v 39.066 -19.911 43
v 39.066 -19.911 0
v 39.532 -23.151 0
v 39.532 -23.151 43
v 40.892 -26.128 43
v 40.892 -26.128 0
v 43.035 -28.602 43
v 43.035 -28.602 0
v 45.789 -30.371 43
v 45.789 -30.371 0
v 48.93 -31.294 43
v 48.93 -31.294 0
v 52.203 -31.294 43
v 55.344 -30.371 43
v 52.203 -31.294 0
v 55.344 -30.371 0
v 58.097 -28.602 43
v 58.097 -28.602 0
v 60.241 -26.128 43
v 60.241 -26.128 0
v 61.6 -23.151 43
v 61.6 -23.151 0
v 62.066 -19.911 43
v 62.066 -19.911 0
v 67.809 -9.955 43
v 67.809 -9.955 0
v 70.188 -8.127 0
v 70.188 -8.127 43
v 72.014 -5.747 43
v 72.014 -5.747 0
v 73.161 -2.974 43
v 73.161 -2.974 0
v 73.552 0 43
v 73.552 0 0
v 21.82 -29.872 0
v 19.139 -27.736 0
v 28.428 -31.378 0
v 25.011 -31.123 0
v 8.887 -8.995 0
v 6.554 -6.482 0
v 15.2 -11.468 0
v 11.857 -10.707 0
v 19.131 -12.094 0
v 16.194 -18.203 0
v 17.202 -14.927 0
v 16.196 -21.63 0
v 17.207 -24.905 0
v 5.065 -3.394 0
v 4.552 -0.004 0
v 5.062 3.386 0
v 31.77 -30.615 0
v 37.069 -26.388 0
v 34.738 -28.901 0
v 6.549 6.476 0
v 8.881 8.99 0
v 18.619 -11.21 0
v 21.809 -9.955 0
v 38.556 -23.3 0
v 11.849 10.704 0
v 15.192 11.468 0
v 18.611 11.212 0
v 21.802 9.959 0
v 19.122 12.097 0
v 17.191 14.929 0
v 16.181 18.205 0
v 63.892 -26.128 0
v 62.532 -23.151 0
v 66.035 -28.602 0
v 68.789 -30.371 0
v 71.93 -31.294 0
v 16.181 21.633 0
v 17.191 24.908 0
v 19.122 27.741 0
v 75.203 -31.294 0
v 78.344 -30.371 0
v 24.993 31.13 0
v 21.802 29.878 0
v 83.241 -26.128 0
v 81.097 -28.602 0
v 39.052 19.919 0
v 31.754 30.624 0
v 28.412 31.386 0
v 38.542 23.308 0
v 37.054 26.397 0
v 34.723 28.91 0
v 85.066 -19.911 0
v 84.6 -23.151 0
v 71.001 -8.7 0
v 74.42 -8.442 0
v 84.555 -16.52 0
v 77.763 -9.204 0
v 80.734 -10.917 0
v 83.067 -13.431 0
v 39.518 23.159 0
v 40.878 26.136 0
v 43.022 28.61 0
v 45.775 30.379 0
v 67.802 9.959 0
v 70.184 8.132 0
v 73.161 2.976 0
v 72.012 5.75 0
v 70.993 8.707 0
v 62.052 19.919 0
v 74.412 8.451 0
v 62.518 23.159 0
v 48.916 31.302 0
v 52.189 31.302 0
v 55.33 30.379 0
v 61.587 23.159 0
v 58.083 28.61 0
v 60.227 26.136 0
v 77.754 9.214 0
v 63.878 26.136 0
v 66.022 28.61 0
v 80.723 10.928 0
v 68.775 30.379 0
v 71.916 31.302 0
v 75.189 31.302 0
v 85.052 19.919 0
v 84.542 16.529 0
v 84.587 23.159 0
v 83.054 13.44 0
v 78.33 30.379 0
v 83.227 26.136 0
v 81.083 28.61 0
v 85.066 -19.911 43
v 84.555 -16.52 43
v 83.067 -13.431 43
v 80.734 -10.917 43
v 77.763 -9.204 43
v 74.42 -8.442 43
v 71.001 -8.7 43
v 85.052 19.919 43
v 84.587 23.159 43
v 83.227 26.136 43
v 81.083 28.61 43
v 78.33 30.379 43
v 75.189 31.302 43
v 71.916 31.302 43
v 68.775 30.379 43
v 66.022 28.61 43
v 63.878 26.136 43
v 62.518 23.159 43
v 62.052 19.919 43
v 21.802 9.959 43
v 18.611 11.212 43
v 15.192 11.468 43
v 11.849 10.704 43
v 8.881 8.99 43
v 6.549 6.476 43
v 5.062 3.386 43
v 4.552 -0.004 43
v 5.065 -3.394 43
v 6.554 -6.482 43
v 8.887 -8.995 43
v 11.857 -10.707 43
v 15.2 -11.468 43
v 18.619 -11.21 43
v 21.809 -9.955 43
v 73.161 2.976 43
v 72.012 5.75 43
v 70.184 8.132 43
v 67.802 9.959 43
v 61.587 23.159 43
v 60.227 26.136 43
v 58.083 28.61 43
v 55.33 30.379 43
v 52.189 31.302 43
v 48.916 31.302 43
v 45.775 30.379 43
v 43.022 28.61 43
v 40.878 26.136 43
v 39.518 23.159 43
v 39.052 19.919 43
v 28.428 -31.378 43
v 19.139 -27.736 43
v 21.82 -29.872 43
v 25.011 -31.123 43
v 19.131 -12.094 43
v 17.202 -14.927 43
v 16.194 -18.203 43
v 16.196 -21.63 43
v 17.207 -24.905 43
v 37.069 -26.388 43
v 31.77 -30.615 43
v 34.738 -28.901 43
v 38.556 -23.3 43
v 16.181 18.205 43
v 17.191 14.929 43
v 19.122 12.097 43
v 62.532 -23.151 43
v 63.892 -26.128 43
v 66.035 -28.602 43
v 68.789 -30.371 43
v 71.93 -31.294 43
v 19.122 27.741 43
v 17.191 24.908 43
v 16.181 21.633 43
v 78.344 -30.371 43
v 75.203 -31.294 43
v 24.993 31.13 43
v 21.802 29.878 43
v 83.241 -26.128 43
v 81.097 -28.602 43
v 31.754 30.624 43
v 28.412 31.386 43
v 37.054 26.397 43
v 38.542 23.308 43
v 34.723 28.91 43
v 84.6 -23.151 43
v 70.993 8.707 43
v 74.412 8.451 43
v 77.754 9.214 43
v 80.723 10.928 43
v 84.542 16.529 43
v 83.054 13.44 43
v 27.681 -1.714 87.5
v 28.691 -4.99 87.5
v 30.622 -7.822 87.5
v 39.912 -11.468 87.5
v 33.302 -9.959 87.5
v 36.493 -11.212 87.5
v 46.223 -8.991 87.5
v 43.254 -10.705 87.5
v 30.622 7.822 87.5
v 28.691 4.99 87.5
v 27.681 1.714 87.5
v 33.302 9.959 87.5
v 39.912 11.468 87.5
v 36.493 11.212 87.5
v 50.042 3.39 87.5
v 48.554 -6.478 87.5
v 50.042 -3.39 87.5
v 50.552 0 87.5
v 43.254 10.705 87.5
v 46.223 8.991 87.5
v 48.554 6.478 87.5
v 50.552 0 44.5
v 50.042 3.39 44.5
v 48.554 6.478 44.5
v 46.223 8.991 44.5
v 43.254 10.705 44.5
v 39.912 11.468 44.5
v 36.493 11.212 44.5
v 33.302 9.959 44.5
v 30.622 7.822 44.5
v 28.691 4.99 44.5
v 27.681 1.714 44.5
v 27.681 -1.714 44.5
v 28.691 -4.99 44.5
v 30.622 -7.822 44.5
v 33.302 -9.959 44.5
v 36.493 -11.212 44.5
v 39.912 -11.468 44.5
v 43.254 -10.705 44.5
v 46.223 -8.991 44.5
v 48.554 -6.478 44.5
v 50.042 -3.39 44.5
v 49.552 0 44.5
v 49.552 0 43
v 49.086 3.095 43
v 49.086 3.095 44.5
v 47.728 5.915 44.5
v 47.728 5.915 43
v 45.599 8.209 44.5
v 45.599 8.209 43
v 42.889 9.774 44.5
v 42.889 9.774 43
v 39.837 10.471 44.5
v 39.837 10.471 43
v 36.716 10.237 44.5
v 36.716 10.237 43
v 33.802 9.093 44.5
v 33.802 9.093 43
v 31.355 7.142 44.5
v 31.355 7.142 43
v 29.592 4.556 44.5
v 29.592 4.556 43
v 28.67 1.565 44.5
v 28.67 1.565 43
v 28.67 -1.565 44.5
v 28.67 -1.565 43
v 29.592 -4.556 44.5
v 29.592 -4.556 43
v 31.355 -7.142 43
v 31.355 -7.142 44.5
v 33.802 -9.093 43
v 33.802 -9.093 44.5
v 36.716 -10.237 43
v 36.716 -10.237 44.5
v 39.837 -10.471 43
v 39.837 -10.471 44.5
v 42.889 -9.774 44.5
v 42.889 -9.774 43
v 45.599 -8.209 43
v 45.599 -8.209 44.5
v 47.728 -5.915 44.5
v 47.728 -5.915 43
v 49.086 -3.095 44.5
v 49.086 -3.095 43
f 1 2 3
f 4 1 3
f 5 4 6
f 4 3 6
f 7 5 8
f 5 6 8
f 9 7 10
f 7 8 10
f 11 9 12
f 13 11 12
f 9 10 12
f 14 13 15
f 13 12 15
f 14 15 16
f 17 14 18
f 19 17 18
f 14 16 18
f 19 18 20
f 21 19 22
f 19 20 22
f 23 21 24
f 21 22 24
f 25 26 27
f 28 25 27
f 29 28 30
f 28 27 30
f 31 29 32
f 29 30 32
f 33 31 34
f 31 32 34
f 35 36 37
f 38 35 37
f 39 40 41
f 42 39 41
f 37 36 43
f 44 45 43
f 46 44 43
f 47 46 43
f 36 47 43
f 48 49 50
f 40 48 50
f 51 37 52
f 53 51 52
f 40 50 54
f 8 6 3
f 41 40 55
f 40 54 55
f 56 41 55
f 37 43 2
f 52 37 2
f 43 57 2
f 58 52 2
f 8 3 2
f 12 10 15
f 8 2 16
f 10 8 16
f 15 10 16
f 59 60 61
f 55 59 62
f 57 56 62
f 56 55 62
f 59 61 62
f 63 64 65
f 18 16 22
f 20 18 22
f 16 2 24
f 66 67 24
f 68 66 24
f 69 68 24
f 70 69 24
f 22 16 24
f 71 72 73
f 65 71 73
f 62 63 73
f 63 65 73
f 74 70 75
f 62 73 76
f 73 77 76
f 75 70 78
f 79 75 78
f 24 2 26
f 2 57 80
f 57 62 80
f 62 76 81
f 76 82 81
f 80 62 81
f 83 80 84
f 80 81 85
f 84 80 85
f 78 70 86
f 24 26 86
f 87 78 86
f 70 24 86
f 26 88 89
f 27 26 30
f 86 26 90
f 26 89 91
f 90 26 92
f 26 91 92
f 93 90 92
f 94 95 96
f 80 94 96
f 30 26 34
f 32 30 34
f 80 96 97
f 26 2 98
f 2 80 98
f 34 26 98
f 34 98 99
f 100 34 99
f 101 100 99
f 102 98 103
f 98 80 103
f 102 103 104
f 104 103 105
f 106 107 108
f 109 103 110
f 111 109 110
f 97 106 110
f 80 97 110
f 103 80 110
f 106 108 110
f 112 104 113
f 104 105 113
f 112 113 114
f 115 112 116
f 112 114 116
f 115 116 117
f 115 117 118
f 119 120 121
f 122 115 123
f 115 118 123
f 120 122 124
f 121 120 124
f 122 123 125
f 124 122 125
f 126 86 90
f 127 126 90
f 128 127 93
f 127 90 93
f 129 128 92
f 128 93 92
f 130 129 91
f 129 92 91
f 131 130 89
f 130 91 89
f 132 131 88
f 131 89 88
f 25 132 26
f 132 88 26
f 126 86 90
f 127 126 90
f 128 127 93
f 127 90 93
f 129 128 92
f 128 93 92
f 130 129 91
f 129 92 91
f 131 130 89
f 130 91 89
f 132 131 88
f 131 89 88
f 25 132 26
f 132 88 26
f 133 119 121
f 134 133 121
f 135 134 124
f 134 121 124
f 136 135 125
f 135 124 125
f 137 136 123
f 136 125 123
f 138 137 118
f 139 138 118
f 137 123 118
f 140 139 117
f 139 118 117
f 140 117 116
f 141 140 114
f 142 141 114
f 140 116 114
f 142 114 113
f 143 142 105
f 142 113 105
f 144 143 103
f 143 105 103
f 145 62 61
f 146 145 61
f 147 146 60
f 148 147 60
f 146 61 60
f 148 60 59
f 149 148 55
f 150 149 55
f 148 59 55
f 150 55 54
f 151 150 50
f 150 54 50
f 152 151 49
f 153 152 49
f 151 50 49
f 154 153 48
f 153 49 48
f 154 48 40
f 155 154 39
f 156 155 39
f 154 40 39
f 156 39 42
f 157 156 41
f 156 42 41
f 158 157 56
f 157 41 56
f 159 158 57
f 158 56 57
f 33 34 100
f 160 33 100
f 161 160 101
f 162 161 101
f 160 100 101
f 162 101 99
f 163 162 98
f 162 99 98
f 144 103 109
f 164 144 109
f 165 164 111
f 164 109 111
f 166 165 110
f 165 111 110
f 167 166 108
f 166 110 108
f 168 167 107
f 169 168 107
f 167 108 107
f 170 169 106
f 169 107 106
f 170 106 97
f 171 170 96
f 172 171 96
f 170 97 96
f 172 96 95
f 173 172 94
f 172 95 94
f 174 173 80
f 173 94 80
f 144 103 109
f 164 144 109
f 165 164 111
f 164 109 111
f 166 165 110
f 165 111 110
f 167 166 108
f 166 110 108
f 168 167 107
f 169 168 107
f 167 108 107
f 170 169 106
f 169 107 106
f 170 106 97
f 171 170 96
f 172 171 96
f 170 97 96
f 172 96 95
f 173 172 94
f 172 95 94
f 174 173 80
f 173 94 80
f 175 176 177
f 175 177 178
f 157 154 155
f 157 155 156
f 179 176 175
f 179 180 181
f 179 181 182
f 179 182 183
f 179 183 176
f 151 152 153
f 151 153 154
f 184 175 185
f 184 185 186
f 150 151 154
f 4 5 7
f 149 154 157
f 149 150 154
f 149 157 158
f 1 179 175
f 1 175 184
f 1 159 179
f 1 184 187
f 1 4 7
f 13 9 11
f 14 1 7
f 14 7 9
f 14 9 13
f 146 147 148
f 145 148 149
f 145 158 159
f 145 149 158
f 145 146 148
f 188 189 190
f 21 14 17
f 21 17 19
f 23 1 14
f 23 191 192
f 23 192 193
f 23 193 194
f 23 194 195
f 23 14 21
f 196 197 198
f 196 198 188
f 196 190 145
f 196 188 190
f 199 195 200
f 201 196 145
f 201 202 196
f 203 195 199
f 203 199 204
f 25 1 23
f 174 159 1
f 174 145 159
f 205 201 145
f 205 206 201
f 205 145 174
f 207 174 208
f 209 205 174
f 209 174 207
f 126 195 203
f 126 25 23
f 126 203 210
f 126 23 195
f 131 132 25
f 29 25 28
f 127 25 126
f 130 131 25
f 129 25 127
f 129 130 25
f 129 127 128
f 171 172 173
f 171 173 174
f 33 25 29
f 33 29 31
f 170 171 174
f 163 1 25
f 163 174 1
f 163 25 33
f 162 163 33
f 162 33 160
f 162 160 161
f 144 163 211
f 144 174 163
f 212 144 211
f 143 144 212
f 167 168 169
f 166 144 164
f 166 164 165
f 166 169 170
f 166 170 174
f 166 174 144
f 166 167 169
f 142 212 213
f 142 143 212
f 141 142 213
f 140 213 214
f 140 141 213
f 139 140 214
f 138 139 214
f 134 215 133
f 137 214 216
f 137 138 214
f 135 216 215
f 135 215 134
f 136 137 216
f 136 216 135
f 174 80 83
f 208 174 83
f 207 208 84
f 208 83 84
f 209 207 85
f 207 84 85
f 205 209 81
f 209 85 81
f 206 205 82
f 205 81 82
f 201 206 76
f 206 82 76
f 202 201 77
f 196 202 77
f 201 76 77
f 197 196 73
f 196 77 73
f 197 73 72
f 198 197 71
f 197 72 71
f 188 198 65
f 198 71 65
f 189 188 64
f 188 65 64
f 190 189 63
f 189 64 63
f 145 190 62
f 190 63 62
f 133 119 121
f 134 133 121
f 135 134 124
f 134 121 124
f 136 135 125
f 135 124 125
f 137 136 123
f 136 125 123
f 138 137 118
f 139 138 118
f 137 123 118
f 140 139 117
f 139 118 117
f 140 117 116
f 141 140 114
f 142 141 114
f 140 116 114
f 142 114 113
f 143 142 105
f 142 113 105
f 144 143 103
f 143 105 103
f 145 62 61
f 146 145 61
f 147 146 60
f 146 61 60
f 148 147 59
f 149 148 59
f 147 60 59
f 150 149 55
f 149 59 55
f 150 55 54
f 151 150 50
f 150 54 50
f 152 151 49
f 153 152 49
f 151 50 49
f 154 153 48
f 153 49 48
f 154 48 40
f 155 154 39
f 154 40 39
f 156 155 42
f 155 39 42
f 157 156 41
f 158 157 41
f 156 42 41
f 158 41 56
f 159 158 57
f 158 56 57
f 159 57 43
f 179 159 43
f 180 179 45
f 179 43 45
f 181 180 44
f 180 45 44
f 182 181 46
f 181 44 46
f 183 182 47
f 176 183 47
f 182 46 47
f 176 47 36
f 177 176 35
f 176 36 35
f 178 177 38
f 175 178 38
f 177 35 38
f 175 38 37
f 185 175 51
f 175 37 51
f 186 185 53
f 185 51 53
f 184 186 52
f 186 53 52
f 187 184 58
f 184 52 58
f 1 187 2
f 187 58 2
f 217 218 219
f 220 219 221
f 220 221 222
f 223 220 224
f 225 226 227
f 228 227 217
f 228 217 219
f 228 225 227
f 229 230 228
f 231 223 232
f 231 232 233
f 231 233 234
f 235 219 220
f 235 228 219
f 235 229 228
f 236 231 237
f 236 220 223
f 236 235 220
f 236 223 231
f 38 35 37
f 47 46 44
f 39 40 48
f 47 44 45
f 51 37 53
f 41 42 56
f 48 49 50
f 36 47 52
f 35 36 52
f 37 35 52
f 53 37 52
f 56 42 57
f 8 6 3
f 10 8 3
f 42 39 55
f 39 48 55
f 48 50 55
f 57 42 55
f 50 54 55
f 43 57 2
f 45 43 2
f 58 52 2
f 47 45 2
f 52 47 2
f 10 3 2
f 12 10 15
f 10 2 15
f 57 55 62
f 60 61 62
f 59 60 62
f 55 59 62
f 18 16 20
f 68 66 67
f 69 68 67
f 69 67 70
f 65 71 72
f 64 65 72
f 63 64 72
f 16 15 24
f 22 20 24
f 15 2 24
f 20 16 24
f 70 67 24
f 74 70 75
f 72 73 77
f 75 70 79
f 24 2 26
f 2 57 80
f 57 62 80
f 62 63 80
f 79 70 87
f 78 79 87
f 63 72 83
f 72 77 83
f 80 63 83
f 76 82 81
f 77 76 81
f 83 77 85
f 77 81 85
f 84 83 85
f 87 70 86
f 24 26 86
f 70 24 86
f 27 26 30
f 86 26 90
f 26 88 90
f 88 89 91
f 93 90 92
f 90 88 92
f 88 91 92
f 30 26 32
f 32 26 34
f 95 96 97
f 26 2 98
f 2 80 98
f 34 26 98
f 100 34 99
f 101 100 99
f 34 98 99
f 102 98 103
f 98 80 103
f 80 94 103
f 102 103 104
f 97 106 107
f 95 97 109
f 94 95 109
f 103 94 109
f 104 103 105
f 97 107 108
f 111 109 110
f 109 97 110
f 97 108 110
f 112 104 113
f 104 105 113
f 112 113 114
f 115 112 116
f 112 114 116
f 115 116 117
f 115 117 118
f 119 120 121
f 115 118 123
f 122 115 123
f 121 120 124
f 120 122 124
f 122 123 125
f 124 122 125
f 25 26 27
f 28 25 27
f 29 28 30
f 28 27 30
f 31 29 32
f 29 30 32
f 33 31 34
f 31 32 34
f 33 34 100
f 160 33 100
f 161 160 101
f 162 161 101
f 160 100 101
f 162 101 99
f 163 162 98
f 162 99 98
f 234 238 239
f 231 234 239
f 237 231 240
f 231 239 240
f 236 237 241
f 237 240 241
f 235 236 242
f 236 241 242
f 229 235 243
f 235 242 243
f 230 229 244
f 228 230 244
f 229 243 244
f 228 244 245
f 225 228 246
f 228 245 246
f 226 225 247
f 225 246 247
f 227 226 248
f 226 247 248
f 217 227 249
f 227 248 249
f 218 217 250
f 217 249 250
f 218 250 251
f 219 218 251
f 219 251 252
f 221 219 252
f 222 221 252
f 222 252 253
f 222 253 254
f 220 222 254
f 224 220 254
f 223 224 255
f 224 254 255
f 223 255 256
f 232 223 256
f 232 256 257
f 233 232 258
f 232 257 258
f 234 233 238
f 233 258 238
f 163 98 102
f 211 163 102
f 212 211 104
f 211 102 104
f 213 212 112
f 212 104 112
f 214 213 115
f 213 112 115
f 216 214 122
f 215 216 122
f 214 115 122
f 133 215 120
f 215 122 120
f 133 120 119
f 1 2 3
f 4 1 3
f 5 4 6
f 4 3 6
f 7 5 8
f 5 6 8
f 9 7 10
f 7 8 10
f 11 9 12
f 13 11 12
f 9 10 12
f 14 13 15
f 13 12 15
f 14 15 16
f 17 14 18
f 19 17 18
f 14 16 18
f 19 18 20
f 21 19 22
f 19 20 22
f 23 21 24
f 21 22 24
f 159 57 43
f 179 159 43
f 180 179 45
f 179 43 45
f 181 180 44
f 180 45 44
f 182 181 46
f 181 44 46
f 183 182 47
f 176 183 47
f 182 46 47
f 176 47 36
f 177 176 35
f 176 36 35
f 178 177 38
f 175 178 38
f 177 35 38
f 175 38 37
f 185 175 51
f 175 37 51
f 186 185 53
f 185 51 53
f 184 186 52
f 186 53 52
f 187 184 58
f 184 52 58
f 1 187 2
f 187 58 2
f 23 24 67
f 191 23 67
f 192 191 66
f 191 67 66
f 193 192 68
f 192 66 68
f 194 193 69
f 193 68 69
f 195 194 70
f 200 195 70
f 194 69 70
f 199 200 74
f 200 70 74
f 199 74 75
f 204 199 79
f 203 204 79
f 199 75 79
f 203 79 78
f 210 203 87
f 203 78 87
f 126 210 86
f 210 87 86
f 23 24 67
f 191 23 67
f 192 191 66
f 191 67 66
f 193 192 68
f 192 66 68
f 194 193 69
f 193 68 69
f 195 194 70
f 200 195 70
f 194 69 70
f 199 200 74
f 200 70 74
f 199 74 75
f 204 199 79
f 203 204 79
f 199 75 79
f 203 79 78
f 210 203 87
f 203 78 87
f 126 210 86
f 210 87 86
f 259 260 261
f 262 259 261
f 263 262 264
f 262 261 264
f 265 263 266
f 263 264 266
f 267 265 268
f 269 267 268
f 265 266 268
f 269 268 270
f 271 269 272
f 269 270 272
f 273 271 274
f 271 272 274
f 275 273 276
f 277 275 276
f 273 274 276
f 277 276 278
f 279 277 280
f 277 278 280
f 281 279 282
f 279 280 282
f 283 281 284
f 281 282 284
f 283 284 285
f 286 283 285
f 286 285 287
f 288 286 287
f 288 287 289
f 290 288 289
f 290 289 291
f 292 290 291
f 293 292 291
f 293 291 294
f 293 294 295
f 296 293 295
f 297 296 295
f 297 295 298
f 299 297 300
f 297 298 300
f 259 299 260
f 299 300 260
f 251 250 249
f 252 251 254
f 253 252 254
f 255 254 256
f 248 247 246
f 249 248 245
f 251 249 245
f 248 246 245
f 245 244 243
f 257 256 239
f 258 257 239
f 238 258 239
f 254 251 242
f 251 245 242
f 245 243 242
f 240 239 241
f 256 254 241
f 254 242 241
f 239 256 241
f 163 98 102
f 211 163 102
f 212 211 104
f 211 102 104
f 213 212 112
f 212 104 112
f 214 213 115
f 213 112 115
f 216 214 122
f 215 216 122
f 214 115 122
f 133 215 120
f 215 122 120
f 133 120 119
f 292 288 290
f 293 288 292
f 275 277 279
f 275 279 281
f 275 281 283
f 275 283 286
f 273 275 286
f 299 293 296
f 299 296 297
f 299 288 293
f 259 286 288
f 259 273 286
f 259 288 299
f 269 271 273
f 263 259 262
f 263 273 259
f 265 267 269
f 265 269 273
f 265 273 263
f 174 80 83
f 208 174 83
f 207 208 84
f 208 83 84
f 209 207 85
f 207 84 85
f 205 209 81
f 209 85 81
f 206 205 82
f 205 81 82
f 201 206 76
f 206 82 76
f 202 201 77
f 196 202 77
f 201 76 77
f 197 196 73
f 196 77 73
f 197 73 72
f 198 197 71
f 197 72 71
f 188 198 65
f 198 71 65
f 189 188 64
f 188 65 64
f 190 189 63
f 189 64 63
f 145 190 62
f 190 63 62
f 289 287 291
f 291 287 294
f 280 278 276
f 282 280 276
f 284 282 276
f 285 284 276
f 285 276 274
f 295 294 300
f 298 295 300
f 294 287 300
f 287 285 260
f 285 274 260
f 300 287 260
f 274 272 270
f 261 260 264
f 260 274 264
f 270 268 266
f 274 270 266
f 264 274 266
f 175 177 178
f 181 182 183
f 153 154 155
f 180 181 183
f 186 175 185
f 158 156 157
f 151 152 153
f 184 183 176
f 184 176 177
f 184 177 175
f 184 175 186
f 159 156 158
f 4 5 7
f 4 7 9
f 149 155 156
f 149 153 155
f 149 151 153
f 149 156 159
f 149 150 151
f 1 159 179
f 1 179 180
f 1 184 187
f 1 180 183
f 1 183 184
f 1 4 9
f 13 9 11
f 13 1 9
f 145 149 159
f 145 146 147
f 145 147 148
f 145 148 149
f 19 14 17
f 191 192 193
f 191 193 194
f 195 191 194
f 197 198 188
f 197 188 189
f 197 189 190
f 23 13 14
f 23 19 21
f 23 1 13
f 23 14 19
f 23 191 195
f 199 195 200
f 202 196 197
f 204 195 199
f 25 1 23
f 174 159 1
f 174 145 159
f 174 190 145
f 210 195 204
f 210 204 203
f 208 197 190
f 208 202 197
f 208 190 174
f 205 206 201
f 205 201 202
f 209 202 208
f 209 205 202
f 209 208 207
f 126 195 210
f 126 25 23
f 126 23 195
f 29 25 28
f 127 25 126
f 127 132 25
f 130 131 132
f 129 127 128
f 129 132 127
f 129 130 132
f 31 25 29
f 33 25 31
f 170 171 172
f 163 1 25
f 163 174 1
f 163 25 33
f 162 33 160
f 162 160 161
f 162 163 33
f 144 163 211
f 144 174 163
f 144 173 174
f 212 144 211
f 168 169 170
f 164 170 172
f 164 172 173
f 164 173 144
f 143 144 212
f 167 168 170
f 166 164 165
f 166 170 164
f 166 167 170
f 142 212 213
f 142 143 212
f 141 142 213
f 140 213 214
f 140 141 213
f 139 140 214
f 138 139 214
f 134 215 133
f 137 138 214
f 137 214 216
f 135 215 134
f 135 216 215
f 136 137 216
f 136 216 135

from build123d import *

# Parameters (mm, degrees)
F2_DEPTH = 43
F4_R     = 10.5
F5_DEPTH = 1.5
F8_R     = 11.5
F9_DEPTH = 43


with BuildPart() as f2:
    # F1 (on Top) → F2 (new body)
    with BuildSketch(Plane.XY):
        with BuildLine():
            ThreePointArc((85.0524389676, 19.918584287), (73.5524389676, 31.418584287), (62.0524389676, 19.918584287))
            ThreePointArc((62.0524389676, 19.918584287), (63.5931467664, 14.168584387), (67.8024387677, 9.9592922589))
            ThreePointArc((67.8024387677, 9.9592922589), (79.3024388676, 9.9592920858), (85.0524389676, 19.918584287))
        make_face()
        with BuildLine():
            ThreePointArc((67.8093484759, -9.95529974), (63.6049713282, -14.1640552846), (62.066257831, -19.9105995686))
            ThreePointArc((62.066257831, -19.9105995686), (73.566257831, -31.4105995686), (85.066257831, -19.9105995686))
            ThreePointArc((85.066257831, -19.9105995686), (79.312802115, -9.9493130657), (67.8093484759, -9.95529974))
        make_face()
        with BuildLine():
            ThreePointArc((33.3024389273, 9.9592921203), (37.5117310995, 14.1685842669), (39.0524389676, 19.918584287))
            ThreePointArc((39.0524389676, 19.918584287), (21.8024390217, 29.8778764618), (21.8024388594, 9.959292206))
            ThreePointArc((21.8024388594, 9.959292206), (27.5524388819, 8.418584287), (33.3024389273, 9.9592921203))
        make_face()
        with BuildLine():
            ThreePointArc((27.5524389676, 0), (26.0117310799, 5.7500000541), (21.8024388594, 9.959292206))
            ThreePointArc((21.8024388594, 9.959292206), (4.5524396598, -0.0039899827), (21.8093483274, -9.9552998259))
            ThreePointArc((21.8093483274, -9.9552998259), (26.0137254718, -5.7465442817), (27.5524389676, 0))
        make_face()
        with BuildLine():
            ThreePointArc((33.3024389273, 9.9592921203), (27.5524388819, 8.418584287), (21.8024388594, 9.959292206))
            ThreePointArc((21.8024388594, 9.959292206), (26.0117310799, 5.7500000541), (27.5524389676, 0))
            ThreePointArc((27.5524389676, 0), (29.0931468125, 5.7499999799), (33.3024389273, 9.9592921203))
        make_face()
        with BuildLine():
            ThreePointArc((44.8024388594, 9.959292206), (40.5931467929, 14.1685843411), (39.0524389676, 19.918584287))
            ThreePointArc((39.0524389676, 19.918584287), (37.5117310995, 14.1685842669), (33.3024389273, 9.9592921203))
            ThreePointArc((33.3024389273, 9.9592921203), (39.0524388819, 11.5), (44.8024388594, 9.959292206))
        make_face()
        with BuildLine():
            ThreePointArc((32.9640435524, -9.7560976455), (28.9959349211, -5.5782368507), (27.5524389676, 0))
            ThreePointArc((27.5524389676, 0), (26.0137254718, -5.7465442817), (21.8093483274, -9.9552998259))
            ThreePointArc((21.8093483274, -9.9552998259), (27.360921887, -8.4124328821), (32.9640435524, -9.7560976455))
        make_face()
        with BuildLine():
            ThreePointArc((32.9640435524, -9.7560976455), (27.360921887, -8.4124328821), (21.8093483274, -9.9552998259))
            ThreePointArc((21.8093483274, -9.9552998259), (21.8197136213, -29.8718861143), (39.066257831, -19.9105995686))
            ThreePointArc((39.066257831, -19.9105995686), (37.6227618775, -14.3323627178), (33.6546532462, -10.1545019231))
            ThreePointArc((33.6546532462, -10.1545019231), (33.3058947219, -9.961286525), (32.9640435524, -9.7560976455))
        make_face()
        with BuildLine():
            ThreePointArc((33.6546532462, -10.1545019231), (37.6227618775, -14.3323627178), (39.066257831, -19.9105995686))
            ThreePointArc((39.066257831, -19.9105995686), (40.6049713407, -14.1640552628), (44.8093485194, -9.9552997148))
            ThreePointArc((44.8093485194, -9.9552997148), (39.2577749395, -11.498166686), (33.6546532462, -10.1545019231))
        make_face()
        with BuildLine():
            ThreePointArc((62.0524389676, 19.918584287), (50.5524389676, 31.418584287), (39.0524389676, 19.918584287))
            ThreePointArc((39.0524389676, 19.918584287), (40.5931467929, 14.1685843411), (44.8024388594, 9.959292206))
            ThreePointArc((44.8024388594, 9.959292206), (50.5524390206, 8.418584287), (56.3024391675, 9.9592922589))
            ThreePointArc((56.3024391675, 9.9592922589), (60.5117311688, 14.168584387), (62.0524389676, 19.918584287))
        make_face()
        with BuildLine():
            ThreePointArc((67.8024387677, 9.9592922589), (63.5931467664, 14.168584387), (62.0524389676, 19.918584287))
            ThreePointArc((62.0524389676, 19.918584287), (60.5117311688, 14.168584387), (56.3024391675, 9.9592922589))
            ThreePointArc((56.3024391675, 9.9592922589), (62.0524389676, 11.5), (67.8024387677, 9.9592922589))
        make_face()
        with BuildLine():
            ThreePointArc((56.6546532462, -10.1545019231), (60.6227618775, -14.3323627178), (62.066257831, -19.9105995686))
            ThreePointArc((62.066257831, -19.9105995686), (63.6049713282, -14.1640552846), (67.8093484759, -9.95529974))
            ThreePointArc((67.8093484759, -9.95529974), (62.2577749143, -11.4981666864), (56.6546532462, -10.1545019231))
        make_face()
        with BuildLine():
            ThreePointArc((44.8093485194, -9.9552997148), (40.6049713407, -14.1640552628), (39.066257831, -19.9105995686))
            ThreePointArc((39.066257831, -19.9105995686), (50.566257831, -31.4105995686), (62.066257831, -19.9105995686))
            ThreePointArc((62.066257831, -19.9105995686), (60.6227618775, -14.3323627178), (56.6546532462, -10.1545019231))
            ThreePointArc((56.6546532462, -10.1545019231), (56.3058947219, -9.961286525), (55.9640435524, -9.7560976455))
            ThreePointArc((55.9640435524, -9.7560976455), (50.3609219979, -8.4124328801), (44.8093485194, -9.9552997148))
        make_face()
        with BuildLine():
            ThreePointArc((67.8024387677, 9.9592922589), (62.0524389676, 11.5), (56.3024391675, 9.9592922589))
            ThreePointArc((56.3024391675, 9.9592922589), (52.0931468818, 5.7500001), (50.5524389676, 0))
            ThreePointArc((50.5524389676, 0), (51.9959349211, -5.5782368507), (55.9640435524, -9.7560976455))
            ThreePointArc((55.9640435524, -9.7560976455), (56.3128020767, -9.9493130436), (56.6546532462, -10.1545019231))
            ThreePointArc((56.6546532462, -10.1545019231), (62.2577749143, -11.4981666864), (67.8093484759, -9.95529974))
            ThreePointArc((67.8093484759, -9.95529974), (72.0137255147, -5.7465442074), (73.5524389676, 0))
            ThreePointArc((73.5524389676, 0), (72.0117310534, 5.7500001), (67.8024387677, 9.9592922589))
        make_face()
        with BuildLine():
            ThreePointArc((44.8024388594, 9.959292206), (39.0524388819, 11.5), (33.3024389273, 9.9592921203))
            ThreePointArc((33.3024389273, 9.9592921203), (29.0931468125, 5.7499999799), (27.5524389676, 0))
            ThreePointArc((27.5524389676, 0), (28.9959349211, -5.5782368507), (32.9640435524, -9.7560976455))
            ThreePointArc((32.9640435524, -9.7560976455), (33.3128020767, -9.9493130436), (33.6546532462, -10.1545019231))
            ThreePointArc((33.6546532462, -10.1545019231), (39.2577749395, -11.498166686), (44.8093485194, -9.9552997148))
            ThreePointArc((44.8093485194, -9.9552997148), (49.0137255272, -5.7465441856), (50.5524389676, 0))
            ThreePointArc((50.5524389676, 0), (49.0117310799, 5.7500000541), (44.8024388594, 9.959292206))
        make_face()
        with BuildLine():
            ThreePointArc((56.3024391675, 9.9592922589), (50.5524390206, 8.418584287), (44.8024388594, 9.959292206))
            ThreePointArc((44.8024388594, 9.959292206), (49.0117310799, 5.7500000541), (50.5524389676, 0))
            ThreePointArc((50.5524389676, 0), (52.0931468818, 5.7500001), (56.3024391675, 9.9592922589))
        make_face()
        with BuildLine():
            ThreePointArc((55.9640435524, -9.7560976455), (51.9959349211, -5.5782368507), (50.5524389676, 0))
            ThreePointArc((50.5524389676, 0), (49.0137255272, -5.7465441856), (44.8093485194, -9.9552997148))
            ThreePointArc((44.8093485194, -9.9552997148), (50.3609219979, -8.4124328801), (55.9640435524, -9.7560976455))
        make_face()
        with BuildLine():
            ThreePointArc((56.6546532462, -10.1545019231), (56.3128020767, -9.9493130436), (55.9640435524, -9.7560976455))
            ThreePointArc((55.9640435524, -9.7560976455), (56.3058947219, -9.961286525), (56.6546532462, -10.1545019231))
        make_face()
        with BuildLine():
            ThreePointArc((33.6546532462, -10.1545019231), (33.3128020767, -9.9493130436), (32.9640435524, -9.7560976455))
            ThreePointArc((32.9640435524, -9.7560976455), (33.3058947219, -9.961286525), (33.6546532462, -10.1545019231))
        make_face()
    extrude(amount=F2_DEPTH)


with BuildPart() as f2b:
    # F0 (on Top) → F2, piece 2 (new body)
    with BuildSketch(Plane.XY):
        with BuildLine():
            ThreePointArc((33.3024389273, 9.9592921203), (29.0931468125, 5.7499999799), (27.5524389676, 0))
            ThreePointArc((27.5524389676, 0), (28.9959349211, -5.5782368507), (32.9640435524, -9.7560976455))
            ThreePointArc((32.9640435524, -9.7560976455), (33.3128020767, -9.9493130436), (33.6546532462, -10.1545019231))
            ThreePointArc((33.6546532462, -10.1545019231), (39.2577749143, -11.4981666864), (44.8093484759, -9.95529974))
            ThreePointArc((44.8093484759, -9.95529974), (49.0137255147, -5.7465442074), (50.5524389676, 0))
            ThreePointArc((50.5524389676, 0), (49.0117310799, 5.7500000541), (44.8024388594, 9.959292206))
            ThreePointArc((44.8024388594, 9.959292206), (39.0524388819, 11.5), (33.3024389273, 9.9592921203))
        make_face()
        with BuildLine():
            ThreePointArc((56.6546532462, -10.1545019231), (60.6227618775, -14.3323627178), (62.066257831, -19.9105995686))
            ThreePointArc((62.066257831, -19.9105995686), (63.6049713282, -14.1640552846), (67.8093484759, -9.95529974))
            ThreePointArc((67.8093484759, -9.95529974), (62.2577749143, -11.4981666864), (56.6546532462, -10.1545019231))
        make_face()
        with BuildLine():
            ThreePointArc((67.8024387677, 9.9592922589), (63.5931467664, 14.168584387), (62.0524389676, 19.918584287))
            ThreePointArc((62.0524389676, 19.918584287), (60.5117311688, 14.168584387), (56.3024391675, 9.9592922589))
            ThreePointArc((56.3024391675, 9.9592922589), (62.0524389676, 11.5), (67.8024387677, 9.9592922589))
        make_face()
        with BuildLine():
            ThreePointArc((44.8093484759, -9.95529974), (40.6049713282, -14.1640552846), (39.066257831, -19.9105995686))
            ThreePointArc((39.066257831, -19.9105995686), (50.566257831, -31.4105995686), (62.066257831, -19.9105995686))
            ThreePointArc((62.066257831, -19.9105995686), (60.6227618775, -14.3323627178), (56.6546532462, -10.1545019231))
            ThreePointArc((56.6546532462, -10.1545019231), (56.3058947219, -9.961286525), (55.9640435524, -9.7560976455))
            ThreePointArc((55.9640435524, -9.7560976455), (50.3609219728, -8.4124328806), (44.8093484759, -9.95529974))
        make_face()
        with BuildLine():
            ThreePointArc((67.8024387677, 9.9592922589), (62.0524389676, 11.5), (56.3024391675, 9.9592922589))
            ThreePointArc((56.3024391675, 9.9592922589), (52.0931468818, 5.7500001), (50.5524389676, 0))
            ThreePointArc((50.5524389676, 0), (51.9959349211, -5.5782368507), (55.9640435524, -9.7560976455))
            ThreePointArc((55.9640435524, -9.7560976455), (56.3128020767, -9.9493130436), (56.6546532462, -10.1545019231))
            ThreePointArc((56.6546532462, -10.1545019231), (62.2577749143, -11.4981666864), (67.8093484759, -9.95529974))
            ThreePointArc((67.8093484759, -9.95529974), (72.0137255147, -5.7465442074), (73.5524389676, 0))
            ThreePointArc((73.5524389676, 0), (72.0117310534, 5.7500001), (67.8024387677, 9.9592922589))
        make_face()
        with BuildLine():
            ThreePointArc((50.5524389676, 0), (49.0137255147, -5.7465442074), (44.8093484759, -9.95529974))
            ThreePointArc((44.8093484759, -9.95529974), (50.3609219728, -8.4124328806), (55.9640435524, -9.7560976455))
            ThreePointArc((55.9640435524, -9.7560976455), (51.9959349211, -5.5782368507), (50.5524389676, 0))
        make_face()
        with BuildLine():
            ThreePointArc((85.0524389676, 19.918584287), (73.5524389676, 31.418584287), (62.0524389676, 19.918584287))
            ThreePointArc((62.0524389676, 19.918584287), (63.5931467664, 14.168584387), (67.8024387677, 9.9592922589))
            ThreePointArc((67.8024387677, 9.9592922589), (79.3024388676, 9.9592920858), (85.0524389676, 19.918584287))
        make_face()
        with BuildLine():
            ThreePointArc((67.8093484759, -9.95529974), (63.6049713282, -14.1640552846), (62.066257831, -19.9105995686))
            ThreePointArc((62.066257831, -19.9105995686), (73.566257831, -31.4105995686), (85.066257831, -19.9105995686))
            ThreePointArc((85.066257831, -19.9105995686), (79.312802115, -9.9493130657), (67.8093484759, -9.95529974))
        make_face()
        with BuildLine():
            ThreePointArc((21.8093483274, -9.9552998259), (26.0137254718, -5.7465442817), (27.5524389676, 0))
            ThreePointArc((27.5524389676, 0), (26.0117311674, 5.7499999026), (21.8024391624, 9.959292031))
            ThreePointArc((21.8024391624, 9.959292031), (4.5524396597, -0.0039898077), (21.8093483274, -9.9552998259))
        make_face()
        with BuildLine():
            ThreePointArc((39.0524389676, 19.918584287), (21.8024388702, 29.8778763743), (21.8024391624, 9.959292031))
            ThreePointArc((21.8024391624, 9.959292031), (27.5524390568, 8.418584287), (33.3024389273, 9.9592921203))
            ThreePointArc((33.3024389273, 9.9592921203), (37.5117310995, 14.1685842669), (39.0524389676, 19.918584287))
        make_face()
        with BuildLine():
            ThreePointArc((21.8024391624, 9.959292031), (26.0117311674, 5.7499999026), (27.5524389676, 0))
            ThreePointArc((27.5524389676, 0), (29.0931468125, 5.7499999799), (33.3024389273, 9.9592921203))
            ThreePointArc((33.3024389273, 9.9592921203), (27.5524390568, 8.418584287), (21.8024391624, 9.959292031))
        make_face()
        with BuildLine():
            ThreePointArc((32.9640435524, -9.7560976455), (28.9959349211, -5.5782368507), (27.5524389676, 0))
            ThreePointArc((27.5524389676, 0), (26.0137254718, -5.7465442817), (21.8093483274, -9.9552998259))
            ThreePointArc((21.8093483274, -9.9552998259), (27.360921887, -8.4124328821), (32.9640435524, -9.7560976455))
        make_face()
        with BuildLine():
            ThreePointArc((39.0524389676, 19.918584287), (37.5117310995, 14.1685842669), (33.3024389273, 9.9592921203))
            ThreePointArc((33.3024389273, 9.9592921203), (39.0524388819, 11.5), (44.8024388594, 9.959292206))
            ThreePointArc((44.8024388594, 9.959292206), (40.5931467929, 14.1685843411), (39.0524389676, 19.918584287))
        make_face()
        with BuildLine():
            ThreePointArc((32.9640435524, -9.7560976455), (27.360921887, -8.4124328821), (21.8093483274, -9.9552998259))
            ThreePointArc((21.8093483274, -9.9552998259), (21.8197136213, -29.8718861143), (39.066257831, -19.9105995686))
            ThreePointArc((39.066257831, -19.9105995686), (37.6227618775, -14.3323627178), (33.6546532462, -10.1545019231))
            ThreePointArc((33.6546532462, -10.1545019231), (33.3058947219, -9.961286525), (32.9640435524, -9.7560976455))
        make_face()
        with BuildLine():
            ThreePointArc((33.6546532462, -10.1545019231), (37.6227618775, -14.3323627178), (39.066257831, -19.9105995686))
            ThreePointArc((39.066257831, -19.9105995686), (40.6049713282, -14.1640552846), (44.8093484759, -9.95529974))
            ThreePointArc((44.8093484759, -9.95529974), (39.2577749143, -11.4981666864), (33.6546532462, -10.1545019231))
        make_face()
        with BuildLine():
            ThreePointArc((62.0524389676, 19.918584287), (50.5524389676, 31.418584287), (39.0524389676, 19.918584287))
            ThreePointArc((39.0524389676, 19.918584287), (40.5931467929, 14.1685843411), (44.8024388594, 9.959292206))
            ThreePointArc((44.8024388594, 9.959292206), (50.5524390206, 8.418584287), (56.3024391675, 9.9592922589))
            ThreePointArc((56.3024391675, 9.9592922589), (60.5117311688, 14.168584387), (62.0524389676, 19.918584287))
        make_face()
        with BuildLine():
            ThreePointArc((56.3024391675, 9.9592922589), (50.5524390206, 8.418584287), (44.8024388594, 9.959292206))
            ThreePointArc((44.8024388594, 9.959292206), (49.0117310799, 5.7500000541), (50.5524389676, 0))
            ThreePointArc((50.5524389676, 0), (52.0931468818, 5.7500001), (56.3024391675, 9.9592922589))
        make_face()
        with BuildLine():
            ThreePointArc((55.9640435524, -9.7560976455), (56.3058947219, -9.961286525), (56.6546532462, -10.1545019231))
            ThreePointArc((56.6546532462, -10.1545019231), (56.3128020767, -9.9493130436), (55.9640435524, -9.7560976455))
        make_face()
        with BuildLine():
            ThreePointArc((33.6546532462, -10.1545019231), (33.3128020767, -9.9493130436), (32.9640435524, -9.7560976455))
            ThreePointArc((32.9640435524, -9.7560976455), (33.3058947219, -9.961286525), (33.6546532462, -10.1545019231))
        make_face()
    extrude(amount=F2_DEPTH)


with BuildPart() as f5:
    # F4 (on offset) → F5 (new body)
    with BuildSketch(Plane.XY.offset(43)):
        with Locations((39.0524389676, 0)):
            Circle(F4_R)
    extrude(amount=F5_DEPTH)


with BuildPart() as f9:
    # F8 (on offset) → F9 (new body)
    with BuildSketch(Plane.XY.offset(44.5)):
        with Locations((39.0524389676, 0)):
            Circle(F8_R)
    extrude(amount=F9_DEPTH)


solid = Compound([f2.part, f2b.part, f5.part, f9.part])
